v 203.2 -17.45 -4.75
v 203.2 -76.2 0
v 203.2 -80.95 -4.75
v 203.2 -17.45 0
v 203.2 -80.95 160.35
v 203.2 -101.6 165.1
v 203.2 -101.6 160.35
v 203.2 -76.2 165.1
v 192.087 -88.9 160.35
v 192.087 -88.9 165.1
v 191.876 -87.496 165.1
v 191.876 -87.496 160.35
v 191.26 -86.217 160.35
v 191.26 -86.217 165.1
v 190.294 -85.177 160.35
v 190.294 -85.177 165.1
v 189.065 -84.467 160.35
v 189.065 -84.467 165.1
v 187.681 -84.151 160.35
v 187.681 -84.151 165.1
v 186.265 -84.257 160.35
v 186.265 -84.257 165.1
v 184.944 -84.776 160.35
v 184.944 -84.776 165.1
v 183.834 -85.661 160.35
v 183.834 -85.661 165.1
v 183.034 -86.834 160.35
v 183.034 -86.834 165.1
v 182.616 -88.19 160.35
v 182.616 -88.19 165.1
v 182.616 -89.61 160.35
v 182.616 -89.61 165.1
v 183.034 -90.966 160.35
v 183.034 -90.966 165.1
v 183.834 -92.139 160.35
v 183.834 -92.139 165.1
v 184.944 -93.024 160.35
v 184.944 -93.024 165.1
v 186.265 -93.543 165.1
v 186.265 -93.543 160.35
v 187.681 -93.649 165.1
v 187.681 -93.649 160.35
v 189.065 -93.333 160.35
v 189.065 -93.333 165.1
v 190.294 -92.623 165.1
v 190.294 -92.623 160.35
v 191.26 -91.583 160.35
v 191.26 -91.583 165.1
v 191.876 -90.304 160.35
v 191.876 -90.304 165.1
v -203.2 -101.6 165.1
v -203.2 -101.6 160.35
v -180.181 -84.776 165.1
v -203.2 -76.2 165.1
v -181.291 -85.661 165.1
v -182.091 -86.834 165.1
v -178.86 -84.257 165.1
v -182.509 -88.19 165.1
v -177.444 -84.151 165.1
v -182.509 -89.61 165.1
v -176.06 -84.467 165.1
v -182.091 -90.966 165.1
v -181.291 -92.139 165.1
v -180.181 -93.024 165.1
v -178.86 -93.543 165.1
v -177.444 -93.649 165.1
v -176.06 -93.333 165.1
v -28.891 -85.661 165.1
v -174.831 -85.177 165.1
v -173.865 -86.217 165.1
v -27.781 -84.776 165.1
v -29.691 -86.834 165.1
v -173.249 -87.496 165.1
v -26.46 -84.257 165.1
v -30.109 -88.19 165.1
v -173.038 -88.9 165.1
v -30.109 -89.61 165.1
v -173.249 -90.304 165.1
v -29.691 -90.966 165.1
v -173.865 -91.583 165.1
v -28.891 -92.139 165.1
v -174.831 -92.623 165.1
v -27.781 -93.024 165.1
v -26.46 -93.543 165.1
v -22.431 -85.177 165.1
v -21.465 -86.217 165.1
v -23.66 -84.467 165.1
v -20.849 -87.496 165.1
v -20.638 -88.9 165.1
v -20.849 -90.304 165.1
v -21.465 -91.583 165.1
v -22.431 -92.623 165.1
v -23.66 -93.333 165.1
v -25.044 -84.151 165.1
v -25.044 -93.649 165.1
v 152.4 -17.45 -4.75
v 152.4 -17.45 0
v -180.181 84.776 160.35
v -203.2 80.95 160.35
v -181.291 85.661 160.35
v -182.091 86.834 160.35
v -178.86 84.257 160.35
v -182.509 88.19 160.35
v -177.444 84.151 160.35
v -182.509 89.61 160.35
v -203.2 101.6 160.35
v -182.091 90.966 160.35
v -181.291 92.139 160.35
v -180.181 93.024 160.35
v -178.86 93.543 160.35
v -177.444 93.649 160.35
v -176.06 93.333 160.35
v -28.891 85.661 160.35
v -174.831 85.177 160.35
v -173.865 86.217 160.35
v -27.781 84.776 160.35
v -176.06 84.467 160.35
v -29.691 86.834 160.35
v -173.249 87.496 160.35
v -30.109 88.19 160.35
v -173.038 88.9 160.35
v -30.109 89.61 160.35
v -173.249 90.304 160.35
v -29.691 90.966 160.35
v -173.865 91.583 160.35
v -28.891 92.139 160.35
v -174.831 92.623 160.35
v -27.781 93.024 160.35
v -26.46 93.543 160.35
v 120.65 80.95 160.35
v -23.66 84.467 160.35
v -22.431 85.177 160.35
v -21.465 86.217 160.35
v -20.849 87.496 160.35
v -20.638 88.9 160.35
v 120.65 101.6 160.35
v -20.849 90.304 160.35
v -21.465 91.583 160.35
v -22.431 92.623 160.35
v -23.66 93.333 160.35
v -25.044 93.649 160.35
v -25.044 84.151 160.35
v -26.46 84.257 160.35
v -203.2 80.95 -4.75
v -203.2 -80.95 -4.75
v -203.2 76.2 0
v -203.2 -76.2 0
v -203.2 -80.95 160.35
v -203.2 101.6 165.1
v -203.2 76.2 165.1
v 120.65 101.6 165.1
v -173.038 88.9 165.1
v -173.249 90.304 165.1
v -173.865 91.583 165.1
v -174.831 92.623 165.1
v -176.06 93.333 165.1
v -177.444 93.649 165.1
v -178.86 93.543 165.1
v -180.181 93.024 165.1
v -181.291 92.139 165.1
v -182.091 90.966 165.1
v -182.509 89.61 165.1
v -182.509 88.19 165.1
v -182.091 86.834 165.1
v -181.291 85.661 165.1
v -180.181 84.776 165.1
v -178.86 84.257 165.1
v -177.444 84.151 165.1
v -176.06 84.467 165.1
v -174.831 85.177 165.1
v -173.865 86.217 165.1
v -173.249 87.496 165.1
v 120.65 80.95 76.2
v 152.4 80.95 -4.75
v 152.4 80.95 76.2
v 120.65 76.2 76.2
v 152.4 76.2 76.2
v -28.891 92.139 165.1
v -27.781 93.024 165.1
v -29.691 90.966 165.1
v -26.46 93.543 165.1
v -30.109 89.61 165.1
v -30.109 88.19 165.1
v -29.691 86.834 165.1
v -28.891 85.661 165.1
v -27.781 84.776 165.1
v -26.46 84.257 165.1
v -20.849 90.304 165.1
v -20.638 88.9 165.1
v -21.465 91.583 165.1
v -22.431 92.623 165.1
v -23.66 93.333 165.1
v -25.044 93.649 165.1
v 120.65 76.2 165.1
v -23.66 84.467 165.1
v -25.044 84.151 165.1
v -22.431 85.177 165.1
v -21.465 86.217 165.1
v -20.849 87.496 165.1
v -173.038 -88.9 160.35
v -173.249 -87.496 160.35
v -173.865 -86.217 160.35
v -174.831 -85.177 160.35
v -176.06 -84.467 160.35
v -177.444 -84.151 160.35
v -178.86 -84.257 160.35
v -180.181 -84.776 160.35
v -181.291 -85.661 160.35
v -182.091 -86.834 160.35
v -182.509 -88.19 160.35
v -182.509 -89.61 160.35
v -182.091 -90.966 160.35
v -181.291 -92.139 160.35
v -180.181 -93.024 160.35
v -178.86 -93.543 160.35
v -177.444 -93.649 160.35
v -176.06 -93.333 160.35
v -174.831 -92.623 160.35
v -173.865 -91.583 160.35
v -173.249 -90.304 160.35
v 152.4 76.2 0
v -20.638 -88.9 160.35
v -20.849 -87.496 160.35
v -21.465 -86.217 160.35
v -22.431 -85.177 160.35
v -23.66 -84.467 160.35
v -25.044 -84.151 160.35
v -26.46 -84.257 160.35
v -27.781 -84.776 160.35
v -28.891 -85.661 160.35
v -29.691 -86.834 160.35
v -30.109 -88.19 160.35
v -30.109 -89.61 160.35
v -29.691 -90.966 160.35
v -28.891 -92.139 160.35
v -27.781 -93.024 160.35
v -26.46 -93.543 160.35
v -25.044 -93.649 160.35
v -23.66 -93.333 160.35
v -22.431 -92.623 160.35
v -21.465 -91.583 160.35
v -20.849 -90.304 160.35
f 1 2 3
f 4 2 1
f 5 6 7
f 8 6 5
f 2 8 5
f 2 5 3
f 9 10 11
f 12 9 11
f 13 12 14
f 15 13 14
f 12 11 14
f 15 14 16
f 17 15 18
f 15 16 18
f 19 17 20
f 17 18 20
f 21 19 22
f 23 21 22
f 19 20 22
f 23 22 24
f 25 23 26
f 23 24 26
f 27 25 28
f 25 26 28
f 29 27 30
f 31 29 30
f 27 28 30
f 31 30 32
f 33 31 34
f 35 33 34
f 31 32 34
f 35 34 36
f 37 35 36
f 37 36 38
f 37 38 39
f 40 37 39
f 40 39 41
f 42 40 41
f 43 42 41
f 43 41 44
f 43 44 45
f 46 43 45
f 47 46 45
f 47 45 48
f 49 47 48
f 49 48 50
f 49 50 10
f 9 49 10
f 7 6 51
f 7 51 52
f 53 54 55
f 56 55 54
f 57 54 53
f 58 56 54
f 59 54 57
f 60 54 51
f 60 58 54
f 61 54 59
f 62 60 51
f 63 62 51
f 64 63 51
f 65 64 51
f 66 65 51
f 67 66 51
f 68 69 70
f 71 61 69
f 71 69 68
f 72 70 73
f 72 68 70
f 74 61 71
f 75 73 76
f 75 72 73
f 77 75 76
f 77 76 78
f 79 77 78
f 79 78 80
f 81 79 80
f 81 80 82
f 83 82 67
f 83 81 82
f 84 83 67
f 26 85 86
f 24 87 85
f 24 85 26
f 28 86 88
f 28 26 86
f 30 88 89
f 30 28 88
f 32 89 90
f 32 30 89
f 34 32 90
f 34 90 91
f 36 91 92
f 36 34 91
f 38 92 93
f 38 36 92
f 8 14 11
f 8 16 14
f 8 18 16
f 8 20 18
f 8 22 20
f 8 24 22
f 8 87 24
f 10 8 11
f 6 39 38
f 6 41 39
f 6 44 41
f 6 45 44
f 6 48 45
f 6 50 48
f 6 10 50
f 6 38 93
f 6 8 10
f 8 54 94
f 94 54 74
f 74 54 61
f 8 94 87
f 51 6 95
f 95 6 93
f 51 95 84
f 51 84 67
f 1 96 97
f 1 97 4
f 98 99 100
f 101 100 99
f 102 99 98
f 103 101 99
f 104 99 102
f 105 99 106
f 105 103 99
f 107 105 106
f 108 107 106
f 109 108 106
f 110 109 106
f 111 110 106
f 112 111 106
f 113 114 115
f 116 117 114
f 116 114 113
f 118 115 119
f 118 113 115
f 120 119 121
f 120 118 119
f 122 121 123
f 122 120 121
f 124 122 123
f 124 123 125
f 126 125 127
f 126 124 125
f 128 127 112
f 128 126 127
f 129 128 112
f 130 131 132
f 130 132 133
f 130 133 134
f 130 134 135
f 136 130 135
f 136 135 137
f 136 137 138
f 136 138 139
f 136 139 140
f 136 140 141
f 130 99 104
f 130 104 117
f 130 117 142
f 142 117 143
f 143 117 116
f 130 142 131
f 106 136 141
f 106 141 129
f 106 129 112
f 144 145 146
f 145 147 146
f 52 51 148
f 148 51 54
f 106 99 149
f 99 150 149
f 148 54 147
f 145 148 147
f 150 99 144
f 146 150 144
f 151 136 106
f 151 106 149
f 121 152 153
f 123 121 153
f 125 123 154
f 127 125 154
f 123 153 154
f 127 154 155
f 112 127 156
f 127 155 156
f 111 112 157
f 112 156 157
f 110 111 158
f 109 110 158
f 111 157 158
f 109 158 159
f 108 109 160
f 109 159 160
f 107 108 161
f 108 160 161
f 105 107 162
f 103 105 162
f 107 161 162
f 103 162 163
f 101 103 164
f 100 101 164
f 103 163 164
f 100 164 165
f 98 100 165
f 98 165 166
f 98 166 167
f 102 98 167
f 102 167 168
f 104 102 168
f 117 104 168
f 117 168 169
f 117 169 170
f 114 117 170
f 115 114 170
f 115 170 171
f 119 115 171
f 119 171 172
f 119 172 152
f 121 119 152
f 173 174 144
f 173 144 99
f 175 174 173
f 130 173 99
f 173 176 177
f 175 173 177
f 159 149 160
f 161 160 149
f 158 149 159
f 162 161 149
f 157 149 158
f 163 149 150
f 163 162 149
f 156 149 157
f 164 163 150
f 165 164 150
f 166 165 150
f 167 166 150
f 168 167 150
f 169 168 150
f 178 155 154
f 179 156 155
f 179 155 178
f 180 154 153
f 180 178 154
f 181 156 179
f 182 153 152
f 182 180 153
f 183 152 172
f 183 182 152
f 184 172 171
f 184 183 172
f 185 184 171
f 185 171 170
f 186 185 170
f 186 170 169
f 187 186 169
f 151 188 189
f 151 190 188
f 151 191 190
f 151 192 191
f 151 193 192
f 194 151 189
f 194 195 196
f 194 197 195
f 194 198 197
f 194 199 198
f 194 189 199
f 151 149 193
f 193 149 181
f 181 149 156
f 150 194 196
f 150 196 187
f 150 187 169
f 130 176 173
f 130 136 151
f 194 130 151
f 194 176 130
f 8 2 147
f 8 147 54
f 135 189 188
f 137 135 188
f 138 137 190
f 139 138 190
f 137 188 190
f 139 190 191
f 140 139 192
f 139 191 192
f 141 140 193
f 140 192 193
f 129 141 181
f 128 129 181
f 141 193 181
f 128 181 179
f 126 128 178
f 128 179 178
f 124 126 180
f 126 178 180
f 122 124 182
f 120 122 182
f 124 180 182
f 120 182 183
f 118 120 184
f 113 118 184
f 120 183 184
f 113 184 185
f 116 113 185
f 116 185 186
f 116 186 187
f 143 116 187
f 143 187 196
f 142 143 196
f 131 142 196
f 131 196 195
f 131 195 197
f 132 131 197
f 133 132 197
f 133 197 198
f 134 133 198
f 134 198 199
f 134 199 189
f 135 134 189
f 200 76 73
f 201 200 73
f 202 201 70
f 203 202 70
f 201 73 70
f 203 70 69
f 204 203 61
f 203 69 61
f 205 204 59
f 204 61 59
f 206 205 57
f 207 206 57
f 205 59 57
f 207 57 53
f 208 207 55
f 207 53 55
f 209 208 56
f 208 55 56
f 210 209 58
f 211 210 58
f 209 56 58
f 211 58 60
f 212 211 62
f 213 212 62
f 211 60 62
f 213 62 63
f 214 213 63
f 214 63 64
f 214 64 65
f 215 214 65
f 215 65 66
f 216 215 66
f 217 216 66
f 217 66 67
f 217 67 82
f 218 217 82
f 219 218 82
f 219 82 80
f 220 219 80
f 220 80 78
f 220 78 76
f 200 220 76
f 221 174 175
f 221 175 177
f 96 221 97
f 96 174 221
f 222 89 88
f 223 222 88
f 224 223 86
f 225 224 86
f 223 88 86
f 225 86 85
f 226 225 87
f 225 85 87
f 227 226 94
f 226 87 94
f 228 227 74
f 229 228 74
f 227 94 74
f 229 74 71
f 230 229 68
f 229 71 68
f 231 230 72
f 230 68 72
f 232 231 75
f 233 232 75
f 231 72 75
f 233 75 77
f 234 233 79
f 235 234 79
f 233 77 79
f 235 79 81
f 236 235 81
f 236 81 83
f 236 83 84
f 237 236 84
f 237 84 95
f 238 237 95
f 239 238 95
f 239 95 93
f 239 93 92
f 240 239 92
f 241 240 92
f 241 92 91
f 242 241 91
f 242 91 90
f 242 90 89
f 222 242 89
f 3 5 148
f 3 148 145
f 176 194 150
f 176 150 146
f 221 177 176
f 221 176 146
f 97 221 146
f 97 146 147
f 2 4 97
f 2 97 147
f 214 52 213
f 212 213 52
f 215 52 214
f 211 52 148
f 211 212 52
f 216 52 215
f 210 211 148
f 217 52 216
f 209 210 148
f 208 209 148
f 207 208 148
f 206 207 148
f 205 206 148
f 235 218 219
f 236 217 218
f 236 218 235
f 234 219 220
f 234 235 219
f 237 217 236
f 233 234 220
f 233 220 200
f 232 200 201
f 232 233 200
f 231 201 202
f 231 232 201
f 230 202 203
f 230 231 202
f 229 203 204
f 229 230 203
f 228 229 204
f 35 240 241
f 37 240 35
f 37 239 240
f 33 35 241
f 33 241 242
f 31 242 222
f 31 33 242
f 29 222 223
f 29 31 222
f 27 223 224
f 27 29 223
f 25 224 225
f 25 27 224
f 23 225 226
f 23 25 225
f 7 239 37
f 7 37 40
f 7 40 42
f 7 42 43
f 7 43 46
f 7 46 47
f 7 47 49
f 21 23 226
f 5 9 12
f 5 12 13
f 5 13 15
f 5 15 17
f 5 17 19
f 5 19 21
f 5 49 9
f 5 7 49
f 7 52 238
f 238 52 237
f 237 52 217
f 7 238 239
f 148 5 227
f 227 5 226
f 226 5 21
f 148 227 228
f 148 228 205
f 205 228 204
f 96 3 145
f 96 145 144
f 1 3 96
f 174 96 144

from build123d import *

# Parameters (mm, degrees)
F1_DEPTH = 203.2
F2_W     = 82.55
F2_H     = 88.9
F3_DEPTH = 101.601
F4_W     = 50.8
F4_H     = 98.3996
F5_DEPTH = 169.8508
F6_R     = 4.7625
F7_DEPTH = 169.8508


with BuildPart() as f1:
    # F0 (on Right) → F1 (new body, symmetric)
    with BuildSketch(Plane.YZ):
        Polygon((76.2, 0), (-76.2, 0), (-76.2, 165.1), (-101.6, 165.1), (-101.6, 160.3502), (-80.9498, 160.3502), (-80.9498, -4.7498), (80.9498, -4.7498), (80.9498, 160.3502), (101.6, 160.3502), (101.6, 165.1), (76.2, 165.1), align=None)
    extrude(amount=F1_DEPTH, both=True)

    # F2 (on Front) → F3 (cut, through all)
    with BuildSketch(Plane.XZ):
        with Locations((161.925, 120.65)):
            Rectangle(F2_W, F2_H)
    extrude(amount=-F3_DEPTH, mode=Mode.SUBTRACT)

    # F4 (on face) → F5 (cut, through all)
    with BuildSketch(Plane(origin=(0, 0, -4.7498), x_dir=(1, 0, 0), z_dir=(0, 0, -1))):
        with Locations((177.8, -31.75)):
            Rectangle(F4_W, F4_H)
    extrude(amount=-F5_DEPTH, mode=Mode.SUBTRACT)

    # F6 (on face) → F7 (cut, through all)
    with BuildSketch(Plane.XY.offset(165.1)):
        with Locations((-177.8, 88.9)):
            Circle(F6_R)
        with Locations((-25.4, 88.9)):
            Circle(F6_R)
        with Locations((-177.8, -88.9)):
            Circle(F6_R)
        with Locations((-25.4, -88.9)):
            Circle(F6_R)
        with Locations((187.325, -88.9)):
            Circle(F6_R)
    extrude(amount=-F7_DEPTH, mode=Mode.SUBTRACT)


solid = f1.part
